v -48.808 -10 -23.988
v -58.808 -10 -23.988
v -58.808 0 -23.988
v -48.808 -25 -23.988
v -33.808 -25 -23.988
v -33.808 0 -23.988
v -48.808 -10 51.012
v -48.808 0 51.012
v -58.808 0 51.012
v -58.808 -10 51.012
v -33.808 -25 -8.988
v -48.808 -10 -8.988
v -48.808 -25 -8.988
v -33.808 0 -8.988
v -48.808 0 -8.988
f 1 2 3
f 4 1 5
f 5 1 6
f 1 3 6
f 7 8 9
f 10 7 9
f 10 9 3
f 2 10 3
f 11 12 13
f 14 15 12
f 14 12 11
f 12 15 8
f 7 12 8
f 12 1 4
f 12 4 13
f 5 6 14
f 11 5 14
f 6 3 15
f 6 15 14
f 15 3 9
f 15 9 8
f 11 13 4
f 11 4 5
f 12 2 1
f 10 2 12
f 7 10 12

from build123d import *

# Parameters (mm, degrees)
F1_DEPTH = 10
F0_W     = 15
F0_H     = 15
F2_DEPTH = 25


with BuildPart() as f1:
    # F0 (on Front) → F1 (new body)
    with BuildSketch(Plane.XZ):
        Polygon((-48.808126, 51.012476), (-58.808126, 51.012476), (-58.808126, -23.987524), (-48.808126, -23.987524), (-48.808126, -8.987524), align=None)
    extrude(amount=F1_DEPTH)

    # F0 (on Front) → F2 (join)
    with BuildSketch(Plane.XZ):
        with Locations((-41.308126, -16.487524)):
            Rectangle(F0_W, F0_H)
    extrude(amount=F2_DEPTH)


solid = f1.part
